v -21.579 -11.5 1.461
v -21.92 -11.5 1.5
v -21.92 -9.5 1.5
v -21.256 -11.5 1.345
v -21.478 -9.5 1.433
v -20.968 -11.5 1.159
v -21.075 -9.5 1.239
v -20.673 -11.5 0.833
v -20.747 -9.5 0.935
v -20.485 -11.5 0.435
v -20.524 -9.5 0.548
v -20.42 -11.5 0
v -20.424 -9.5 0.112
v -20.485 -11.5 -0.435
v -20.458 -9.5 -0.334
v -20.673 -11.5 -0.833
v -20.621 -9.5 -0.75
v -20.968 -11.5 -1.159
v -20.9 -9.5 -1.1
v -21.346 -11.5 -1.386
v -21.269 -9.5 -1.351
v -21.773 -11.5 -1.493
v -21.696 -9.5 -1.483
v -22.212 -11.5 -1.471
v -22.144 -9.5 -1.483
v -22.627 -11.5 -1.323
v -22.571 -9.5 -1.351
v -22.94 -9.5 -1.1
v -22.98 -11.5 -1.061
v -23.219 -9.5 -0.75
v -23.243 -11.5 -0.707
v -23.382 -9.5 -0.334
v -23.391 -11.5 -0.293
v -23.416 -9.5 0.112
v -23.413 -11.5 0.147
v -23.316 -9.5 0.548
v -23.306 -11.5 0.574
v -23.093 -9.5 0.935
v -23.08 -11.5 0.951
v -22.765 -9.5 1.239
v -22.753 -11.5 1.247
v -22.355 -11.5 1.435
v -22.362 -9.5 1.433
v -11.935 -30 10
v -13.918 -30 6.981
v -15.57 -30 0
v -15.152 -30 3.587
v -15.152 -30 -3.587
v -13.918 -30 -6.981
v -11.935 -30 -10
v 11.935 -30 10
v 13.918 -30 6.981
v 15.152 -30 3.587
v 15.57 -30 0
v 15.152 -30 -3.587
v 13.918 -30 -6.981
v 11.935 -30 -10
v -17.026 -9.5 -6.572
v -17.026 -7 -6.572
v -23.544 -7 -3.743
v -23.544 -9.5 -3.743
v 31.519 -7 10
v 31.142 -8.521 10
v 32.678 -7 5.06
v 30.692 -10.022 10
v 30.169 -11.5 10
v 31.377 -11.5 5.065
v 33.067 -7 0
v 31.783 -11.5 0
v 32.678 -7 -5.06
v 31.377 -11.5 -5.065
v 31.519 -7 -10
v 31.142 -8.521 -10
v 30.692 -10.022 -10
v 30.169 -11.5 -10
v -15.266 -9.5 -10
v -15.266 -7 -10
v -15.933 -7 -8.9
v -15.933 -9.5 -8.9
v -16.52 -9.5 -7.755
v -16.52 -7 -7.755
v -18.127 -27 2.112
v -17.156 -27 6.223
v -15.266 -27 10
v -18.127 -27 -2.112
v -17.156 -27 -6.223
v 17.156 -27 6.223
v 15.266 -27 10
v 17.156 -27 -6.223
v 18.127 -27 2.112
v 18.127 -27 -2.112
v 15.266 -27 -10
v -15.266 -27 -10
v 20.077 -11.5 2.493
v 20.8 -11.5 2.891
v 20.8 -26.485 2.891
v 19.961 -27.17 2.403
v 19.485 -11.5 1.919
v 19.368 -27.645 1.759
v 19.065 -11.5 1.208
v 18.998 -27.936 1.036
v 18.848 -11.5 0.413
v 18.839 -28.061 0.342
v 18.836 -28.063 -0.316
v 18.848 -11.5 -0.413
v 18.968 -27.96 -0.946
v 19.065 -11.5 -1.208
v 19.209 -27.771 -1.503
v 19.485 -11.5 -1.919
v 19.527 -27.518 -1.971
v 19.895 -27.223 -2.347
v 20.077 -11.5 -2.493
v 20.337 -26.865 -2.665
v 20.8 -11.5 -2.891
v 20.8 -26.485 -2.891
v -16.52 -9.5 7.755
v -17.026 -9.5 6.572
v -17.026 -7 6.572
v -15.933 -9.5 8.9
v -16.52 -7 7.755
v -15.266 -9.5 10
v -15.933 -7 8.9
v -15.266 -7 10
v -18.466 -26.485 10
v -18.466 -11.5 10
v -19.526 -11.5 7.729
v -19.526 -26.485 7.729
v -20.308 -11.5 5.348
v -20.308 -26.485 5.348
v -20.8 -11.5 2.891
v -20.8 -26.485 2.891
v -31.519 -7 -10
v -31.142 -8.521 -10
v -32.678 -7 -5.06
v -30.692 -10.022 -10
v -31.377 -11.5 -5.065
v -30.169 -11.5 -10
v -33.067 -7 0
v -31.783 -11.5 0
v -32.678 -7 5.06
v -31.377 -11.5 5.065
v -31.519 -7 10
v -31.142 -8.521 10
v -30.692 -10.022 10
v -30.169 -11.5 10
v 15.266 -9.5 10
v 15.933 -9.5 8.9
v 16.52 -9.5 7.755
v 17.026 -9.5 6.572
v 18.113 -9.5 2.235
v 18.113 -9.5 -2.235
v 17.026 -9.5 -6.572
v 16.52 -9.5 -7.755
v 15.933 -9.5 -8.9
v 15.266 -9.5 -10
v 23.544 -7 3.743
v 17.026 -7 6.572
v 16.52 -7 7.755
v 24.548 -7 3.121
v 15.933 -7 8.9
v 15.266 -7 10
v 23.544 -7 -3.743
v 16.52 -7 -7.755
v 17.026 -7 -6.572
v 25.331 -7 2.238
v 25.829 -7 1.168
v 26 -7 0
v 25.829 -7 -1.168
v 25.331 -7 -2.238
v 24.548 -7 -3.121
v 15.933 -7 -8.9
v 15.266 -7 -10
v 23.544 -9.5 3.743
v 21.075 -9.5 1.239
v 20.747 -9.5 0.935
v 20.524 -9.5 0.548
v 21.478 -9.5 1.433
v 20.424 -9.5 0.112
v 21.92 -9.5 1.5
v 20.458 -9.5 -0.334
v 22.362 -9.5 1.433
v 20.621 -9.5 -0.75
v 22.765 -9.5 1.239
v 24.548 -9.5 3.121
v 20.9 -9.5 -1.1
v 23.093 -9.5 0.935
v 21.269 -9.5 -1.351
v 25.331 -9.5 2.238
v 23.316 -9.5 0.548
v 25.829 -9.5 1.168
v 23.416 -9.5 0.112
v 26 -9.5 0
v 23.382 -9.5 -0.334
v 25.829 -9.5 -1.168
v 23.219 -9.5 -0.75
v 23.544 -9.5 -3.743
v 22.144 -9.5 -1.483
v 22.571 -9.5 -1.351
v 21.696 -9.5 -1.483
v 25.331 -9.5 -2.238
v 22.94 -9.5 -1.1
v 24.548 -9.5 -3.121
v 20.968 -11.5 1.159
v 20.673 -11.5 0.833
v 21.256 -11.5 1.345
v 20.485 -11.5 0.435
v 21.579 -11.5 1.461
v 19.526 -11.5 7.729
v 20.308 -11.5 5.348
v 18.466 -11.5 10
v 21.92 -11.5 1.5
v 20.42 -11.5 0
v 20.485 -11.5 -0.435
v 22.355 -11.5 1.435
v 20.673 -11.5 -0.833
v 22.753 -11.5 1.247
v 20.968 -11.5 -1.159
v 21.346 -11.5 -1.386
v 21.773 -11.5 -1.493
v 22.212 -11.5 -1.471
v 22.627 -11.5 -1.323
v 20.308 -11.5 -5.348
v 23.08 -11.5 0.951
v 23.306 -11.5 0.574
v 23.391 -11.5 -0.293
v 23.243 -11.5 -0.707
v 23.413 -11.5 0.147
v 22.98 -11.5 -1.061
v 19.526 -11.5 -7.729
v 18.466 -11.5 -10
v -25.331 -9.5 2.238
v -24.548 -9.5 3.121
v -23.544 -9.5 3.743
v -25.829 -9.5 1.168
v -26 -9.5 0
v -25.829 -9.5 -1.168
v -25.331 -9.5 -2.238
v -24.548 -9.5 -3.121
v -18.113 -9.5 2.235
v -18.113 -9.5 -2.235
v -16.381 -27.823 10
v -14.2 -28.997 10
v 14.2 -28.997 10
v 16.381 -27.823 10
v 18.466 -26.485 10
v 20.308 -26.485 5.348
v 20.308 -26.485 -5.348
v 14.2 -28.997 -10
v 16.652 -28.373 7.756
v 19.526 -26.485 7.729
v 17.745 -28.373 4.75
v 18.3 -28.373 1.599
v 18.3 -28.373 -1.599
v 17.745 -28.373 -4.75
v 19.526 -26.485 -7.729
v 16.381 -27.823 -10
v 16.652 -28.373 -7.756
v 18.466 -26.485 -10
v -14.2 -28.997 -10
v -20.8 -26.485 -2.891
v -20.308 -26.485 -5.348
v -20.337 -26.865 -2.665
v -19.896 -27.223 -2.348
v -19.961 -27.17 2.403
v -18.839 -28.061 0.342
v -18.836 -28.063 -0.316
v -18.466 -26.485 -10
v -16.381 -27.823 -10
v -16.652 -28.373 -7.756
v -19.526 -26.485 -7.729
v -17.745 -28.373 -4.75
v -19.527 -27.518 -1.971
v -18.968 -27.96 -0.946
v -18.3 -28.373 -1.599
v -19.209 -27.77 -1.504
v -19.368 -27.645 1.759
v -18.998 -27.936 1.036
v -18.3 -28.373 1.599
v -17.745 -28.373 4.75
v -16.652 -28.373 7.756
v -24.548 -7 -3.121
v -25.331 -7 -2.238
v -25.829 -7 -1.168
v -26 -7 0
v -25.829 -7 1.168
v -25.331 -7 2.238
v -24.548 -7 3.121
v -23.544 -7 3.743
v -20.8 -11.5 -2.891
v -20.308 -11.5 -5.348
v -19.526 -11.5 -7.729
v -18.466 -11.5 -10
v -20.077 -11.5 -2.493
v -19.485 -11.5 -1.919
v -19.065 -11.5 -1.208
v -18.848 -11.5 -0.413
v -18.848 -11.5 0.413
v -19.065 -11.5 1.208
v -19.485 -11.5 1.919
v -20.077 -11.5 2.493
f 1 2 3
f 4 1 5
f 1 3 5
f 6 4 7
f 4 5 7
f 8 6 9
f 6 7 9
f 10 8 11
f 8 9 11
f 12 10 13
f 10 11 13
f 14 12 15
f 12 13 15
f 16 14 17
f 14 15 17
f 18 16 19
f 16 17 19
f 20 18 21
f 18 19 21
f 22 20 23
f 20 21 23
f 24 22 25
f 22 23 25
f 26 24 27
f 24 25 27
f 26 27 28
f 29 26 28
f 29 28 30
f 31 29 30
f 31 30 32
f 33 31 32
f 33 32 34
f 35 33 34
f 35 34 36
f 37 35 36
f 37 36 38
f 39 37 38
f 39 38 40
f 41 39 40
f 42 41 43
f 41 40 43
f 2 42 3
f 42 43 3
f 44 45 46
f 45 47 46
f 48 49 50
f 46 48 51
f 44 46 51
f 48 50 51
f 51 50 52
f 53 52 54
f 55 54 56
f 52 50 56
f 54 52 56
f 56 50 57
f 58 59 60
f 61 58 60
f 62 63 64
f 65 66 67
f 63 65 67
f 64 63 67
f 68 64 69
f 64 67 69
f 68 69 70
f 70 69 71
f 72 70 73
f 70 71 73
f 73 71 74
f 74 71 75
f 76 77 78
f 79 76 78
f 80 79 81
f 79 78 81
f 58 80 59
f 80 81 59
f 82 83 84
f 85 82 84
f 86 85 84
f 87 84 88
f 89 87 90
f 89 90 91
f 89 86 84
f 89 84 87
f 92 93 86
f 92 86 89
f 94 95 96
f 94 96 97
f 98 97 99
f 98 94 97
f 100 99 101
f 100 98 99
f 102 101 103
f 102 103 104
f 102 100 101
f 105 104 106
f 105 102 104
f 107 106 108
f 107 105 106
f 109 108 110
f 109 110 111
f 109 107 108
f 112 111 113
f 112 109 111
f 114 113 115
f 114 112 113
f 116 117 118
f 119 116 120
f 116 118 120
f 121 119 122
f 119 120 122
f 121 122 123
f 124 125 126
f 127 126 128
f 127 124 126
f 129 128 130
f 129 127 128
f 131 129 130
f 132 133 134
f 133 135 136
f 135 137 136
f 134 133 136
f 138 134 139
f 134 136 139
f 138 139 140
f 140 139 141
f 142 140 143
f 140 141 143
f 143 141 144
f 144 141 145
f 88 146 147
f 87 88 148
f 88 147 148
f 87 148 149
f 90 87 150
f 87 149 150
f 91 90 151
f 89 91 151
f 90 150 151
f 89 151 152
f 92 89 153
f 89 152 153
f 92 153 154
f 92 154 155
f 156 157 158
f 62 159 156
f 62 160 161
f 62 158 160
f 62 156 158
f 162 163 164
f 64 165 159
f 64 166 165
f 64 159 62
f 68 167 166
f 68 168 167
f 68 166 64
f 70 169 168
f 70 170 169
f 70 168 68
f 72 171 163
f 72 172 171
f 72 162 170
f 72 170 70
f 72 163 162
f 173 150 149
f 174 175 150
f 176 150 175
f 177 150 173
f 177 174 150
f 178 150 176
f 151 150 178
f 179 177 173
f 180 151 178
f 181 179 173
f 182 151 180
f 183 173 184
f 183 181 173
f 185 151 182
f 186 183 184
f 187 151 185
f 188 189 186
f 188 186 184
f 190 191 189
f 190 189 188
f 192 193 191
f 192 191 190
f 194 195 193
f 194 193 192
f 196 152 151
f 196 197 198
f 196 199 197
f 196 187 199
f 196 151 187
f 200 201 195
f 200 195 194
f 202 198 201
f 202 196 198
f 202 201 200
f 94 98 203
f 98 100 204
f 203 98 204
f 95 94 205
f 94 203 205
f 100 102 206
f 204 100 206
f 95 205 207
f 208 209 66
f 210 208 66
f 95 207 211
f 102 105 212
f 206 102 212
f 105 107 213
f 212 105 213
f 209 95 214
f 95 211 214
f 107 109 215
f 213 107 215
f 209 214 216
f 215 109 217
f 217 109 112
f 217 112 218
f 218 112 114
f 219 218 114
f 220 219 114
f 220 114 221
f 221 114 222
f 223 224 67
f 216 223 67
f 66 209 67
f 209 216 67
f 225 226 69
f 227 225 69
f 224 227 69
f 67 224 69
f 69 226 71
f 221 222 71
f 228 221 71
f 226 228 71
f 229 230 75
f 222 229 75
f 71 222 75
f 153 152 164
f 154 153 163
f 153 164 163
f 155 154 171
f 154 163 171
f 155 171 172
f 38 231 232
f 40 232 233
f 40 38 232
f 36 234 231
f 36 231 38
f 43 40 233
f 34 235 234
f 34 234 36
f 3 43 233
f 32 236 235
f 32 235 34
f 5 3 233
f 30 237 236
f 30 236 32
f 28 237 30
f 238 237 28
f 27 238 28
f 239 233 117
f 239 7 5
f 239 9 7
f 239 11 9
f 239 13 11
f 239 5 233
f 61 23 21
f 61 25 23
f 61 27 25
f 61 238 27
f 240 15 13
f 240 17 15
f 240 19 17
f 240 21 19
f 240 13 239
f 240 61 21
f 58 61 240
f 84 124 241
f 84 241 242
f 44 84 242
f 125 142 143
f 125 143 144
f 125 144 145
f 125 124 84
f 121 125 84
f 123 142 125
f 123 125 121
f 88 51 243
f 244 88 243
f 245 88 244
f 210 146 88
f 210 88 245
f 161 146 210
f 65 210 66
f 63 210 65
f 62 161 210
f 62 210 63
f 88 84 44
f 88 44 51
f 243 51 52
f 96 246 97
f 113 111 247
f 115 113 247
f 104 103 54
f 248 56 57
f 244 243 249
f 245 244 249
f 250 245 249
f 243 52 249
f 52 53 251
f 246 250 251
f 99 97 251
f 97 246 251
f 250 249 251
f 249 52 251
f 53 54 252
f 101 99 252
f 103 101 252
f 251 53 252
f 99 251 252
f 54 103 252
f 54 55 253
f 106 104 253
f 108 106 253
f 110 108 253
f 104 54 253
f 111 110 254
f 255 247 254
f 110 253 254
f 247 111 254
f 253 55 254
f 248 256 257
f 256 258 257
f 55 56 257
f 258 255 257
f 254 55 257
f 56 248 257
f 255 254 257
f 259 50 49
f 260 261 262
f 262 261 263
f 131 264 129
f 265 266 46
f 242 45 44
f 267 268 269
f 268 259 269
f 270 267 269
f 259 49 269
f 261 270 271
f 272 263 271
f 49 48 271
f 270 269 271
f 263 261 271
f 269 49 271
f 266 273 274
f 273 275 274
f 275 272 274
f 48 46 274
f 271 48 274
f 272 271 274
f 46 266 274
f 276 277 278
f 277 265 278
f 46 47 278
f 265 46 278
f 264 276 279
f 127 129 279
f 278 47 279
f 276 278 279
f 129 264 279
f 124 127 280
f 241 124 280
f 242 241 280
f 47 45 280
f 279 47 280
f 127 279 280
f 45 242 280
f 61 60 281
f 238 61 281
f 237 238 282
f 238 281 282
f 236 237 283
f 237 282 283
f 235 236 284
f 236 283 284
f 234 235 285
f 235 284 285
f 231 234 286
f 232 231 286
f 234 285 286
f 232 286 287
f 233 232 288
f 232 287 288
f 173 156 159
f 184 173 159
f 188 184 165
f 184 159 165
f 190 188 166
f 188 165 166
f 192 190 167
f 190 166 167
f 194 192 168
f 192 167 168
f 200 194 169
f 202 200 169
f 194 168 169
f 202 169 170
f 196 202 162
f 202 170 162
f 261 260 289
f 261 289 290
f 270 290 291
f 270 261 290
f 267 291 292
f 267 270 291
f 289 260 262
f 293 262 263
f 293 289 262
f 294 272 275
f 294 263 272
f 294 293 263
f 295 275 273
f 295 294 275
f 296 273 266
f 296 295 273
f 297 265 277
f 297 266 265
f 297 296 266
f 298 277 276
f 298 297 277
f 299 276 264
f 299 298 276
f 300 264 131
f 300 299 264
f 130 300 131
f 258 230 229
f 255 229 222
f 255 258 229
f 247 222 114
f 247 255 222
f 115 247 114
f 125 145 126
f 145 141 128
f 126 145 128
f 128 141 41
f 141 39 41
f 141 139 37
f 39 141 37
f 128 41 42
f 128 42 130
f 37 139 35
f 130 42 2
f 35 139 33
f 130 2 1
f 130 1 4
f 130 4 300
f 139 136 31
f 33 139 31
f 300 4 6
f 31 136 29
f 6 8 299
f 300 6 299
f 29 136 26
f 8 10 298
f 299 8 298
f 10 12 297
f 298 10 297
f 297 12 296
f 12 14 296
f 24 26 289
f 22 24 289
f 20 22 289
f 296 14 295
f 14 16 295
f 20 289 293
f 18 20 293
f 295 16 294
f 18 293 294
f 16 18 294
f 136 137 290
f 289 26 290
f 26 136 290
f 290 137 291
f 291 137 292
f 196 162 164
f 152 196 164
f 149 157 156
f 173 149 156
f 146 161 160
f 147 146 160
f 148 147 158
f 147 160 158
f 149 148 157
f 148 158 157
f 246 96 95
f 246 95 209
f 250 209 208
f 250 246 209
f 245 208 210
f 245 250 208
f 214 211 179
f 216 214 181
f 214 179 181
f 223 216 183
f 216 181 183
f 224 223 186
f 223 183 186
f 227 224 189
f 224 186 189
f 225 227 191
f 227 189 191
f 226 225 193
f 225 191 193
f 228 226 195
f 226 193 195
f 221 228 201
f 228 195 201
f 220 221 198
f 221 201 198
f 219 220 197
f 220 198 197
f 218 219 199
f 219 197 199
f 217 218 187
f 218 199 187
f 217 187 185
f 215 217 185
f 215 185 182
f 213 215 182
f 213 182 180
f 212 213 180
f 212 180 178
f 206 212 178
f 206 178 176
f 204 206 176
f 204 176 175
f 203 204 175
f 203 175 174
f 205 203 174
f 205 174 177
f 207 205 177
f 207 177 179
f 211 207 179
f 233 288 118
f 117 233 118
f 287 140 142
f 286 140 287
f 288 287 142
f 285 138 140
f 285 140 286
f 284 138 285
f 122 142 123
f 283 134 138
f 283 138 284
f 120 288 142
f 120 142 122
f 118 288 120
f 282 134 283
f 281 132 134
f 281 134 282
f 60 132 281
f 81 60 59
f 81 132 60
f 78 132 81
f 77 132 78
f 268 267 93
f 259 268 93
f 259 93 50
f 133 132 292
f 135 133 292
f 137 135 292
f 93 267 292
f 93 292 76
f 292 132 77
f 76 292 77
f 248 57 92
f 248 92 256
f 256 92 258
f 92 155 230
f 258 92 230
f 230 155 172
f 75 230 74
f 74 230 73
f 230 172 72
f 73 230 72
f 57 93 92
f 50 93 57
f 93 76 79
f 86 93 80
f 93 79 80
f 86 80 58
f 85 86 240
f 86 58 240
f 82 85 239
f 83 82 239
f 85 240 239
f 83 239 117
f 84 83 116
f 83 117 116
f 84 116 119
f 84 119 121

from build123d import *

# Parameters (mm, degrees)
SKETCH2_R               = 33.8
CUT_EXTRUDE1_DEPTH      = 7
SKETCH3_OUTSIDE_W       = 87.592
SKETCH3_OUTSIDE_H       = 87.592
SKETCH3_OUTSIDE_W_2     = 66.134408594
SKETCH3_OUTSIDE_H_2     = 20
CUT_EXTRUDE2_DEPTH      = 54.899165114
CUT_EXTRUDE3_DEPTH      = 2.5
SKETCH6_R               = 18.25
SKETCH6_R_2             = 1.5
CUT_EXTRUDE4_DEPTH      = 17.5
CUT_EXTRUDE5_START      = -19.484712572
CUT_EXTRUDE5_DEPTH      = 14.984712572
CUT_EXTRUDE6_START      = -3
SKETCH8_R               = 33.067204297
CUT_EXTRUDE6_DEPTH      = 37.917915802
CUT_EXTRUDE7_REACH      = 41.188
CUT_EXTRUDE7_END_RADIUS = 33.8
SKETCH9_R               = 3.1


# Read off the part's stored shape, not the designer's step: Cut-Extrude5
with BuildPart() as part:
    # Sketch1 → Revolve1 (revolve)
    with BuildSketch(Plane.XY, mode=Mode.PRIVATE) as revolve1_sk:
        with BuildLine():
            Line((0, -33.8), (0, 0))
            Line((0, 0), (33.8, 0))
            ThreePointArc((33.8, 0), (23.900209204, -23.900209204), (0, -33.8))
        make_face()
    revolve(revolve1_sk.sketch.rotate(Axis((0, -33.8, 0), (0, 1, 0)), 180), axis=Axis((0, -33.8, 0), (0, 1, 0)))

    # Sketch2 → Cut-Extrude1 (cut)
    with BuildSketch(Plane(origin=(0, 0, 0), x_dir=(1, 0, 0), z_dir=(0, 1, 0))):
        Circle(SKETCH2_R)
    extrude(amount=-CUT_EXTRUDE1_DEPTH, mode=Mode.SUBTRACT)

    # Sketch3 outside → Cut-Extrude2 (cut, through all)
    with BuildSketch(Plane(origin=(0, -7, 0), x_dir=(1, 0, 0), z_dir=(0, 1, 0))):
        Rectangle(SKETCH3_OUTSIDE_W, SKETCH3_OUTSIDE_H)
        Rectangle(SKETCH3_OUTSIDE_W_2, SKETCH3_OUTSIDE_H_2, mode=Mode.SUBTRACT)
    extrude(amount=-CUT_EXTRUDE2_DEPTH, mode=Mode.SUBTRACT)

    # Sketch5 → Cut-Extrude3 (cut)
    with BuildSketch(Plane(origin=(0, -7, 0), x_dir=(1, 0, 0), z_dir=(0, 1, 0))):
        with BuildLine():
            Line((-17.025732229, 6.571677263), (-23.544283672, 3.742739979))
            ThreePointArc((-23.544283672, 3.742739979), (-26, 0), (-23.544283672, -3.742739979))
            Line((-23.544283672, -3.742739979), (-17.025732229, -6.571677263))
            ThreePointArc((-17.025732229, -6.571677263), (0, -18.25), (17.025732229, -6.571677263))
            Line((17.025732229, -6.571677263), (23.544283672, -3.742739979))
            ThreePointArc((23.544283672, -3.742739979), (26, 0), (23.544283672, 3.742739979))
            Line((23.544283672, 3.742739979), (17.025732229, 6.571677263))
            ThreePointArc((17.025732229, 6.571677263), (0, 18.25), (-17.025732229, 6.571677263))
        make_face()
    extrude(amount=-CUT_EXTRUDE3_DEPTH, mode=Mode.SUBTRACT)

    # Sketch6 → Cut-Extrude4 (cut)
    with BuildSketch(Plane(origin=(0, -9.5, 0), x_dir=(1, 0, 0), z_dir=(0, 1, 0))):
        Circle(SKETCH6_R)
        with Locations(Location((-21.92, 0, 0), (0, 0, 270))):
            Circle(SKETCH6_R_2)
        with Locations(Location((21.92, 0, 0), (0, 0, 270))):
            Circle(SKETCH6_R_2)
    extrude(amount=-CUT_EXTRUDE4_DEPTH, mode=Mode.SUBTRACT)

    # Cut-Extrude5 outline → Cut-Extrude5 (cut)
    with BuildSketch(Plane(origin=(0, -7, 0), x_dir=(1, 0, 0), z_dir=(0, 1, 0)).offset(CUT_EXTRUDE5_START)):
        with BuildLine():
            ThreePointArc((20.967983577, -1.159165532), (20.206521411, -5.718084686), (18.466185313, -10))
            Line((18.466185313, -10), (33, -10))
            Line((33, -10), (33, 10))
            Line((33, 10), (18.466185313, 10))
            ThreePointArc((18.466185313, 10), (20.206521411, 5.718084686), (20.967983577, 1.159165532))
            ThreePointArc((20.967983577, 1.159165532), (23.42, 0), (20.967983577, -1.159165532))
        make_face()
        with BuildLine():
            ThreePointArc((-18.466185313, -10), (-20.206521411, -5.718084686), (-20.967983577, -1.159165532))
            ThreePointArc((-20.967983577, -1.159165532), (-23.42, 0), (-20.967983577, 1.159165532))
            ThreePointArc((-20.967983577, 1.159165532), (-20.206521411, 5.718084686), (-18.466185313, 10))
            Line((-18.466185313, 10), (-33, 10))
            Line((-33, 10), (-33, -10))
            Line((-33, -10), (-18.466185313, -10))
        make_face()
    extrude(amount=CUT_EXTRUDE5_DEPTH, mode=Mode.SUBTRACT)

    # Sketch8 → Cut-Extrude6 (cut, through all)
    with BuildSketch(Plane(origin=(0, -27, 0), x_dir=(1, 0, 0), z_dir=(0, 1, 0)).offset(CUT_EXTRUDE6_START)):
        Circle(SKETCH8_R)
    extrude(amount=-CUT_EXTRUDE6_DEPTH, mode=Mode.SUBTRACT)

    # Cut-Extrude7: up to this sphere (the profile starts inside it)
    cut_extrude7_end = Location((0, 0, 0)) * Sphere(CUT_EXTRUDE7_END_RADIUS, mode=Mode.PRIVATE)
    # Sketch9 → Cut-Extrude7 (cut, up to the surface)
    with BuildSketch(Plane.XZ.offset(11.5), mode=Mode.PRIVATE) as cut_extrude7_sk1:
        with Locations((-21.92, 0)):
            Circle(SKETCH9_R)
    cut_extrude7_tool1 = extrude(cut_extrude7_sk1.sketch, amount=CUT_EXTRUDE7_REACH, mode=Mode.PRIVATE) & cut_extrude7_end
    add(cut_extrude7_tool1.solids().sort_by_distance((-21.92, -11.5, 0))[0], mode=Mode.SUBTRACT)
    # Sketch9 → Cut-Extrude7 (cut, up to the surface)
    with BuildSketch(Plane.XZ.offset(11.5), mode=Mode.PRIVATE) as cut_extrude7_sk2:
        with Locations((21.92, 0)):
            Circle(SKETCH9_R)
    cut_extrude7_tool2 = extrude(cut_extrude7_sk2.sketch, amount=CUT_EXTRUDE7_REACH, mode=Mode.PRIVATE) & cut_extrude7_end
    add(cut_extrude7_tool2.solids().sort_by_distance((21.92, -11.5, 0))[0], mode=Mode.SUBTRACT)


solid = part.part
